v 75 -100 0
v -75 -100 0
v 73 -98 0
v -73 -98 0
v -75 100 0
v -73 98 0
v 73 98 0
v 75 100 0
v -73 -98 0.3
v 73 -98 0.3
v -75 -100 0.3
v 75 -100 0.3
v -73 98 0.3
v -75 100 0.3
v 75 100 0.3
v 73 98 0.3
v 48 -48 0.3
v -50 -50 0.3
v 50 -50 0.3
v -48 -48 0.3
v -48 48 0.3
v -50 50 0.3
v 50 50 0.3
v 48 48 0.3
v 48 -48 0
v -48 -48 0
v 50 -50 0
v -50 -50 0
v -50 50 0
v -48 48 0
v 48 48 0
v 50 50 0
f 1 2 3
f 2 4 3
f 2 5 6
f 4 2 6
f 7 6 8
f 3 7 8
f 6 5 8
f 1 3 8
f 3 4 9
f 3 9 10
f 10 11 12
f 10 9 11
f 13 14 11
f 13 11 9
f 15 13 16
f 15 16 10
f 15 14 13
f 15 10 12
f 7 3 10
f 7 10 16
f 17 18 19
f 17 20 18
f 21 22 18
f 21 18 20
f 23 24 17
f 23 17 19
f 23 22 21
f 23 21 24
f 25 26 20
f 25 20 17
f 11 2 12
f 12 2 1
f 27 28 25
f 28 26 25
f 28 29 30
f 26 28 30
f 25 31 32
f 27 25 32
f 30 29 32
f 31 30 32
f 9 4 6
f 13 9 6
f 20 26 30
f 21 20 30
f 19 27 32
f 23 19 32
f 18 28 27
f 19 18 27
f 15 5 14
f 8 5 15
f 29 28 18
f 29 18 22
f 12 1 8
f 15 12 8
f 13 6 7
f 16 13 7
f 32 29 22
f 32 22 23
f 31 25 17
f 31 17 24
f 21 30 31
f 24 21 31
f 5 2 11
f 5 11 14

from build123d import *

# Parameters (mm, degrees)
F0_W     = 100
F0_H     = 100
F0_W_2   = 96
F0_H_2   = 96
F1_DEPTH = 0.3
F0_W_3   = 150
F0_H_3   = 200
F0_W_4   = 146
F0_H_4   = 196


with BuildPart() as f1:
    # F0 (on Top) → F1 (new body)
    with BuildSketch(Plane.XY):
        Rectangle(F0_W, F0_H)
        Rectangle(F0_W_2, F0_H_2, mode=Mode.SUBTRACT)
    extrude(amount=F1_DEPTH)


with BuildPart() as f1b:
    # F0 (on Top) → F1, piece 2 (new body)
    with BuildSketch(Plane.XY):
        Rectangle(F0_W_3, F0_H_3)
        Rectangle(F0_W_4, F0_H_4, mode=Mode.SUBTRACT)
    extrude(amount=F1_DEPTH)


solid = Compound([f1.part, f1b.part])
